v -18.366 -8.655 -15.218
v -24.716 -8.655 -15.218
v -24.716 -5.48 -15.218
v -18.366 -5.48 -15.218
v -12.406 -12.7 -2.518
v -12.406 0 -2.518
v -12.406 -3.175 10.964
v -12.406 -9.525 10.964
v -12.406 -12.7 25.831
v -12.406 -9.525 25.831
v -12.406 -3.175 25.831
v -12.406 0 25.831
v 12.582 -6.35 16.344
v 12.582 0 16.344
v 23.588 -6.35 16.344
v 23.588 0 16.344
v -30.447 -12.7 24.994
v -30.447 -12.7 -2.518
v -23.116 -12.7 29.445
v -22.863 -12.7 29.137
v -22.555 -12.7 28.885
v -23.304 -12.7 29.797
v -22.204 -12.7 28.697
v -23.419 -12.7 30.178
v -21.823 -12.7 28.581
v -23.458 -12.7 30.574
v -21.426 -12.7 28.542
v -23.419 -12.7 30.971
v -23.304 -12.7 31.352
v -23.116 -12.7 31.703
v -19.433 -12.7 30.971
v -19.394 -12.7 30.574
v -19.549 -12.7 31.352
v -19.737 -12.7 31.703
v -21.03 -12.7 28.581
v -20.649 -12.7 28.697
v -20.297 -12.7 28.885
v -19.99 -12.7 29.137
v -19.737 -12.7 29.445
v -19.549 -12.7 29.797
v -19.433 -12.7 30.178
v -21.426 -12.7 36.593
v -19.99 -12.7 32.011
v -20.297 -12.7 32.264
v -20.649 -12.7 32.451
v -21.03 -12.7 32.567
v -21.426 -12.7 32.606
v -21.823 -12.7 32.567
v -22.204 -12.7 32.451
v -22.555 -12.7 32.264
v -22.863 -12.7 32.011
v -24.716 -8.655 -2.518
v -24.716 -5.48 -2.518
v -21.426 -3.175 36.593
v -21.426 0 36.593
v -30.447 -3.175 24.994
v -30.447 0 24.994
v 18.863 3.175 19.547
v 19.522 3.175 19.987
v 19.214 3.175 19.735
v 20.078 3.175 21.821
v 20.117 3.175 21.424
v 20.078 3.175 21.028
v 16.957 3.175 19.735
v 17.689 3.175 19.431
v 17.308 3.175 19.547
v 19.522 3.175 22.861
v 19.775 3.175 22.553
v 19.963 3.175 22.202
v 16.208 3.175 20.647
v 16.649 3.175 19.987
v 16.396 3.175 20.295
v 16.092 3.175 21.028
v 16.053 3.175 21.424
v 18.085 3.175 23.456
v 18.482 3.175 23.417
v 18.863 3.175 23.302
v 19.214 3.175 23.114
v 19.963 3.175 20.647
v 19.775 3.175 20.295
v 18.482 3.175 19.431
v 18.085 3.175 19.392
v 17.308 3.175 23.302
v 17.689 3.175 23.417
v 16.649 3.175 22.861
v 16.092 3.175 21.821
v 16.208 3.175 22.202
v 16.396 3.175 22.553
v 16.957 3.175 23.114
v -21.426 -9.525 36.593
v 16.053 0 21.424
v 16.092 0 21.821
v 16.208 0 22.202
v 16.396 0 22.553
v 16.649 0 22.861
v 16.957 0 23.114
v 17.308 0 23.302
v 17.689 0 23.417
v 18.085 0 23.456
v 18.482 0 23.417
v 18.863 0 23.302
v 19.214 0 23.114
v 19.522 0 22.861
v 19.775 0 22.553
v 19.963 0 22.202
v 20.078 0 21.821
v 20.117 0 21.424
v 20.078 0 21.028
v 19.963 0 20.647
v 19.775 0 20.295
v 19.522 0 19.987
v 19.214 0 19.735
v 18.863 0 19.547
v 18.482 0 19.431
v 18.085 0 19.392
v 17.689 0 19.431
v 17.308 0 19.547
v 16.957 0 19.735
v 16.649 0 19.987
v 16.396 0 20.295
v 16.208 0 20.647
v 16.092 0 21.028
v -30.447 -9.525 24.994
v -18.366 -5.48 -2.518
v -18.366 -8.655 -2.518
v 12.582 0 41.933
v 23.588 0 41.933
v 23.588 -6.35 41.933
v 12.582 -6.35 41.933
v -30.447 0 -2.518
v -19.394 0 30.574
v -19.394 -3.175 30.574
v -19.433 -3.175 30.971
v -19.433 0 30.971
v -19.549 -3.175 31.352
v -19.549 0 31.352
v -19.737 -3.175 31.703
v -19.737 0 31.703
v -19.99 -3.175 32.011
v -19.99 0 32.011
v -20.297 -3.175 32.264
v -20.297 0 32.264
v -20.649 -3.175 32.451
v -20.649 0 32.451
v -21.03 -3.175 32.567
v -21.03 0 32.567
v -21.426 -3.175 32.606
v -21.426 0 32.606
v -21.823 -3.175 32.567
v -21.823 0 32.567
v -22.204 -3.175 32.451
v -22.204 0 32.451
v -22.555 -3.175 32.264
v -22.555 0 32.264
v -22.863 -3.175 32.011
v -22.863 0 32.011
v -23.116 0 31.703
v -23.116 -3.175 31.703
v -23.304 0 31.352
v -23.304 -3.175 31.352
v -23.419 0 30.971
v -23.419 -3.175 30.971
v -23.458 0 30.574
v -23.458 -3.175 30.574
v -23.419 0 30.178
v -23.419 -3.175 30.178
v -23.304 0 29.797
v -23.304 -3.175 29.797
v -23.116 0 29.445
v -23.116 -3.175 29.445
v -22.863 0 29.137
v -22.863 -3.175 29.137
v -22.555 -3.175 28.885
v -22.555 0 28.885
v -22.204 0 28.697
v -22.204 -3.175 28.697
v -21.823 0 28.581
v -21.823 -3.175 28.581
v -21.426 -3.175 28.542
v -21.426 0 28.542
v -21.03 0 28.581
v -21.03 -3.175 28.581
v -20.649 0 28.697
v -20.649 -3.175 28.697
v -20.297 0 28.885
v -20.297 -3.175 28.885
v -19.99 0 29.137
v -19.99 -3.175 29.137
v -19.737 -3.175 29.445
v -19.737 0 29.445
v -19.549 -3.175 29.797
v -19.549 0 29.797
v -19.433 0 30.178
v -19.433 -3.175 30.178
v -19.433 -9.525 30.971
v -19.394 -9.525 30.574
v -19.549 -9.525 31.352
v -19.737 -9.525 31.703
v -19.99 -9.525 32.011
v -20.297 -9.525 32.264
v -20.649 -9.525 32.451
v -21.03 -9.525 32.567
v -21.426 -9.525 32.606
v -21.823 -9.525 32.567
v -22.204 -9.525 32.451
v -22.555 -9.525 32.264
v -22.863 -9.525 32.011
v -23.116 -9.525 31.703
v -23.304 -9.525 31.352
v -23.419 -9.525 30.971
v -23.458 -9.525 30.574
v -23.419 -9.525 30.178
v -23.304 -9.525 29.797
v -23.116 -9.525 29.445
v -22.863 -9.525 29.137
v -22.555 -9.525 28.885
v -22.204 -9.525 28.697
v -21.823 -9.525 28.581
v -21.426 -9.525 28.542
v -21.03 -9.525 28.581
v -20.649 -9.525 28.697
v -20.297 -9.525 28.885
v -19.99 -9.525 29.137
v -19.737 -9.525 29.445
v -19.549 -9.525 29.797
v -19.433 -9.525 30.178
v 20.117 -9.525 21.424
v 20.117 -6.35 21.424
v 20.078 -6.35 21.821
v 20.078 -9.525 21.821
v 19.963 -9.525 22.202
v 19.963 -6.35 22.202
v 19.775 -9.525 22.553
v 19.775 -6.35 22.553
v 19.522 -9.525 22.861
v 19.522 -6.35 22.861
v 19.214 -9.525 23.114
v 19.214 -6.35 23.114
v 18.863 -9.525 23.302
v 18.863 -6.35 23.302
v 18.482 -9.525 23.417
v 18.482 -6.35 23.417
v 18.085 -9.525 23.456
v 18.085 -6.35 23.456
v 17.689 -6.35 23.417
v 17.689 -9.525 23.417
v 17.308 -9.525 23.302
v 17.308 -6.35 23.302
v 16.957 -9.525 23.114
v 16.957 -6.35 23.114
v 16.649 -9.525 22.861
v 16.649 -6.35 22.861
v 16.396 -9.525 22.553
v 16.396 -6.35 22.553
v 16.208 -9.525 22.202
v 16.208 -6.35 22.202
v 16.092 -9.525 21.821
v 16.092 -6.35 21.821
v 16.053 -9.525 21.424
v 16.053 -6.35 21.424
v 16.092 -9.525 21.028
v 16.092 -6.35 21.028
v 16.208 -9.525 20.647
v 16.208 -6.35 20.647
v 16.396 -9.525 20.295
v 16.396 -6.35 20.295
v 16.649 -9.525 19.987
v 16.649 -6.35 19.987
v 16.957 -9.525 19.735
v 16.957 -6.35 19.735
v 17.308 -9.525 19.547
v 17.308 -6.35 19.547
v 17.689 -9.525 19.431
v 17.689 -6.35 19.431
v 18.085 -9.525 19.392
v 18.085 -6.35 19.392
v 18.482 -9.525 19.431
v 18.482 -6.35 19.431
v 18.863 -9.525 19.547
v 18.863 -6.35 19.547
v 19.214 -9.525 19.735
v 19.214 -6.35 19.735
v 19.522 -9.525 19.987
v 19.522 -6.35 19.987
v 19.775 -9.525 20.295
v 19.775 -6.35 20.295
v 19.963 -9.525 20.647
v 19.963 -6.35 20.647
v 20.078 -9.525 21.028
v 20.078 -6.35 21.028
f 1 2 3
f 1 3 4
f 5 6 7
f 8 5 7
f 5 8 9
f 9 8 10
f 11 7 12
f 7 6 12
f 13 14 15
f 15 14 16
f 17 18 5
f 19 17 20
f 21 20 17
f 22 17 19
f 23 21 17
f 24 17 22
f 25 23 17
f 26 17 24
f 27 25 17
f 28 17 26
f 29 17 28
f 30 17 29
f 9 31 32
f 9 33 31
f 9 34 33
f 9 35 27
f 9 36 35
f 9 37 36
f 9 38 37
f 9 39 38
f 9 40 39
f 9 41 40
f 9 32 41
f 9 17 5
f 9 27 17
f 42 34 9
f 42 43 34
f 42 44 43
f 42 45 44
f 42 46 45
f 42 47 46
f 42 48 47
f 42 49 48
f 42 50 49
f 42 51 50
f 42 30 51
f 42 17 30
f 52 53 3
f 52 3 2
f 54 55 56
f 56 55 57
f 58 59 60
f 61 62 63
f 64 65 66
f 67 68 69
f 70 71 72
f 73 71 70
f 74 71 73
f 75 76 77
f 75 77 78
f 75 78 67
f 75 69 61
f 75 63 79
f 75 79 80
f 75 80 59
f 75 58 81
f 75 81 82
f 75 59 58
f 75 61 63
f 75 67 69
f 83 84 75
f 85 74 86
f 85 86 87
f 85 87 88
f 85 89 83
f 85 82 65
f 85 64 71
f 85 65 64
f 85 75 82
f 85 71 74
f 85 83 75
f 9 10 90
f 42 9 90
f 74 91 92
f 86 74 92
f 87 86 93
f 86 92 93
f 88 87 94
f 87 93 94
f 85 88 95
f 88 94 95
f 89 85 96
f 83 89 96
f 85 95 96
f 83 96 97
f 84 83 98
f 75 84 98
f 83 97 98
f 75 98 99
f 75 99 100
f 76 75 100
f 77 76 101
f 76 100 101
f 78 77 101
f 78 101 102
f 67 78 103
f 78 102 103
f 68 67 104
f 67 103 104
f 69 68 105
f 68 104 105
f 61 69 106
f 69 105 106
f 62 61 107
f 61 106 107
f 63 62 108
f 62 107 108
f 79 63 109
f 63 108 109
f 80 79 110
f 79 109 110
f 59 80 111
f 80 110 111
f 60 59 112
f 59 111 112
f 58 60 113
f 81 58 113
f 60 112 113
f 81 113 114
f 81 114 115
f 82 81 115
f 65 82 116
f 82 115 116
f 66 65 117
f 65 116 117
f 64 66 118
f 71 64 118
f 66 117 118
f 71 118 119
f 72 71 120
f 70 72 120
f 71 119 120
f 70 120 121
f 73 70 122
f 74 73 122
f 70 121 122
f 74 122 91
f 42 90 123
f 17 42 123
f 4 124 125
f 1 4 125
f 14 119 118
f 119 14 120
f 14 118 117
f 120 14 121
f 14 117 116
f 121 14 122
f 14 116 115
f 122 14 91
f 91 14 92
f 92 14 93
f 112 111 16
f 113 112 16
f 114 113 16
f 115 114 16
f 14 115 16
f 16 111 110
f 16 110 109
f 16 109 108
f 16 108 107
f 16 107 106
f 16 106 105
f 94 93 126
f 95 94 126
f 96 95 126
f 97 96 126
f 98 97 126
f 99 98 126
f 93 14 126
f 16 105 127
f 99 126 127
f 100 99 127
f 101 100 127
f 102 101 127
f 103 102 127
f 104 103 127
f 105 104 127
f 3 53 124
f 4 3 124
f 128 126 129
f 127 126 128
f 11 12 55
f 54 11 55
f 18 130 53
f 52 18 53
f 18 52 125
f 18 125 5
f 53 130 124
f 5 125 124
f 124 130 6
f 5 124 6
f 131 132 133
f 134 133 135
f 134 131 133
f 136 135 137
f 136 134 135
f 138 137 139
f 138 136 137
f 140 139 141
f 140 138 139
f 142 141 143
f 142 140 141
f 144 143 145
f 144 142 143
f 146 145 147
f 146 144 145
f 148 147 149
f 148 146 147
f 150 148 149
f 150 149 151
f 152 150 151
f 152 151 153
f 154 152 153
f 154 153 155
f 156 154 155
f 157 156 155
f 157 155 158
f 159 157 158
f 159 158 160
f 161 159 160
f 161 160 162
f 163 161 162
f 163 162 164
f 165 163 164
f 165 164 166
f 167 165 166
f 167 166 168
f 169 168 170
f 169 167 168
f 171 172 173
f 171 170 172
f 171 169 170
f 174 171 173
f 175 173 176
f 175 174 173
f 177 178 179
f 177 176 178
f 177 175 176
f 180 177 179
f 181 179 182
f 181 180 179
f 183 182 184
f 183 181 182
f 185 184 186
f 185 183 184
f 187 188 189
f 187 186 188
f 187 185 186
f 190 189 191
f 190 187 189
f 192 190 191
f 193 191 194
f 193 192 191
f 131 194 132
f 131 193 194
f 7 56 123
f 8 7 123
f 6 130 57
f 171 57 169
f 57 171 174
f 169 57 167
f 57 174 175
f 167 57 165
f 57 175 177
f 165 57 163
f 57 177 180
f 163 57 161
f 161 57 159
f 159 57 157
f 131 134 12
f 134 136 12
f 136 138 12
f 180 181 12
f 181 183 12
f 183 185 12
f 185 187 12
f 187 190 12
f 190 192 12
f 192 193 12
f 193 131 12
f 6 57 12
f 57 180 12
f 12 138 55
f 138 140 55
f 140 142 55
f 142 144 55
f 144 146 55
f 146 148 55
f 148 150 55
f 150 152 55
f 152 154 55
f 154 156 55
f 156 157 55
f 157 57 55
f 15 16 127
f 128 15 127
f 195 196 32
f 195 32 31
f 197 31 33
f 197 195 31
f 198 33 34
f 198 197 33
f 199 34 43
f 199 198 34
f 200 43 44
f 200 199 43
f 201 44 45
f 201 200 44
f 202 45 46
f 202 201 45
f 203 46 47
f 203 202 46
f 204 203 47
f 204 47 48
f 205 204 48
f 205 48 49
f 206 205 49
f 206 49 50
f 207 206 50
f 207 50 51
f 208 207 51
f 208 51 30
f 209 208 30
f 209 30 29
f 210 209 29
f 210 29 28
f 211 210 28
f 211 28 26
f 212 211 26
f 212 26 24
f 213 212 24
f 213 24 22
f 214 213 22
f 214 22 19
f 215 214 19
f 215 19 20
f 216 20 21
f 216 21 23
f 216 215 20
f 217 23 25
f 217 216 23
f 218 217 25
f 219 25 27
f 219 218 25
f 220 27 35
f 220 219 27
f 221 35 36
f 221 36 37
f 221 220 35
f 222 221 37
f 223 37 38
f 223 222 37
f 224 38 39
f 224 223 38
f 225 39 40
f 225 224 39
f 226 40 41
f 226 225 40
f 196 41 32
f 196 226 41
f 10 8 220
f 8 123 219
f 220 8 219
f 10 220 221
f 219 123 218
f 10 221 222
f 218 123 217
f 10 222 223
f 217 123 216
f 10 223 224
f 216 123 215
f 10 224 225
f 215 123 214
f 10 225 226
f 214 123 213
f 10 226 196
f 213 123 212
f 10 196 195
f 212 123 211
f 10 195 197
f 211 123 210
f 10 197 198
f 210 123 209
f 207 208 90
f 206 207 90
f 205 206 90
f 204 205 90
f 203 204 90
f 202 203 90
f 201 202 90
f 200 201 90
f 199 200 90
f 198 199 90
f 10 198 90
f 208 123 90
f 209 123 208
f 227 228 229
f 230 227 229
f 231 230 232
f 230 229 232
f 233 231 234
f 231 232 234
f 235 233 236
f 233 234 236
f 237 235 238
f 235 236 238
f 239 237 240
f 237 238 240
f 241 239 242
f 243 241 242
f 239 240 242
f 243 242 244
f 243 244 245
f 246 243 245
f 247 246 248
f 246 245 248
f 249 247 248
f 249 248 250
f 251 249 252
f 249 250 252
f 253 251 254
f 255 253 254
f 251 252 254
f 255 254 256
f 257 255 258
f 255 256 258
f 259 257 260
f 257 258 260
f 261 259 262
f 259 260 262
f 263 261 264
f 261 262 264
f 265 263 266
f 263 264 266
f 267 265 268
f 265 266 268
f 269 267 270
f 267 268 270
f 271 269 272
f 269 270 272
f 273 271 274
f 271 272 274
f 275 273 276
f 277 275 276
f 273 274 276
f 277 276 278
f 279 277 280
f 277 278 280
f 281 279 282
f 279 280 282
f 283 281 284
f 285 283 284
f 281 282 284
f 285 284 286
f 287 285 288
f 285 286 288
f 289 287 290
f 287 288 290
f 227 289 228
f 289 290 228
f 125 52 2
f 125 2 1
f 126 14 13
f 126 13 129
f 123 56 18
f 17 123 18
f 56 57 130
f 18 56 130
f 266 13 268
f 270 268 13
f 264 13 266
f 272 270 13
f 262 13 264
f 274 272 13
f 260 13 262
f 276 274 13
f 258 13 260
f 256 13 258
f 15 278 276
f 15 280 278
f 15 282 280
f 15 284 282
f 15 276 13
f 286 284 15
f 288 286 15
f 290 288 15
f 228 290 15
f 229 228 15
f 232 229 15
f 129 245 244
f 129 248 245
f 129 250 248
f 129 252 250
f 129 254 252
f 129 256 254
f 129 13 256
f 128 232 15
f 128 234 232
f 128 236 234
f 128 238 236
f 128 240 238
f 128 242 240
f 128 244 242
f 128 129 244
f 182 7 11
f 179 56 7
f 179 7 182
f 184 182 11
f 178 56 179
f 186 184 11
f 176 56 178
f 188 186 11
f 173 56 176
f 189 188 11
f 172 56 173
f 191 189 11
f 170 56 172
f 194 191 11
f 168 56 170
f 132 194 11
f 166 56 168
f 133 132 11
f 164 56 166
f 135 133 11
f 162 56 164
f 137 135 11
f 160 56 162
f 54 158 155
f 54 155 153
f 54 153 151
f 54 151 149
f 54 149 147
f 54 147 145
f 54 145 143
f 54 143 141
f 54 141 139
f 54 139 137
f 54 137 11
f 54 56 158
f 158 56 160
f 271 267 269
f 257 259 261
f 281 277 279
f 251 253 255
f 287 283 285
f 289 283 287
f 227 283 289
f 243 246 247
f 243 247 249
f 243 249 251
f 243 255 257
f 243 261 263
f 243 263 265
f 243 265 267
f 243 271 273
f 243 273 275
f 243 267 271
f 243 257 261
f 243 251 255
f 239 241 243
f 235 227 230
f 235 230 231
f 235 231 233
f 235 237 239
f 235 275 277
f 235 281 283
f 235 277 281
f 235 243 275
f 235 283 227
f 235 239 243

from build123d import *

# Parameters (mm, degrees)
F0_R      = 2.032
F1_DEPTH  = 12.7
F2_W      = 6.35
F2_H      = 14.692879385
F3_DEPTH  = 25.4
F4_W      = 11.0059620068
F4_H      = 25.5892152746
F5_DEPTH  = 6.35
F6_R      = 2.032
F8_DEPTH  = 3.175
F7_R      = 2.032
F9_DEPTH  = 3.175
F10_W     = 6.35
F10_H     = 3.175
F11_DEPTH = 12.7


with BuildPart() as f1:
    # F0 (on Front) → F1 (new body)
    with BuildSketch(Plane.XZ):
        Polygon((-12.4060919796, 25.8314568394), (-21.4263913222, 36.5925505482), (-30.4466906647, 24.9944944872), (-30.4466906647, -2.5175290372), (-12.4060919796, -2.5175290372), align=None)
        with Locations((-21.4263913222, 30.5741173131)):
            Circle(F0_R, mode=Mode.SUBTRACT)
    extrude(amount=F1_DEPTH)

    # F2 (on face) → F3 (cut)
    with BuildSketch(Plane(origin=(-31.0838625283, 0, 24.1752361994), x_dir=(0, -1, 0), z_dir=(-0.7893657708, 0, 0.6139231873))):
        with Locations((6.35, 8.3843087237)):
            Rectangle(F2_W, F2_H)
    extrude(amount=-F3_DEPTH, mode=Mode.SUBTRACT)

    # F10 (on face) → F11 (join)
    with BuildSketch(Plane(origin=(0, 0, -2.5175290372), x_dir=(1, 0, 0), z_dir=(0, 0, -1))):
        with Locations((-21.540818736, 7.0673617972)):
            Rectangle(F10_W, F10_H)
    extrude(amount=F11_DEPTH)


with BuildPart() as f5:
    # F4 (on Front) → F5 (new body)
    with BuildSketch(Plane.XZ):
        with Locations((18.0854215287, 29.1388873011)):
            Rectangle(F4_W, F4_H)
    extrude(amount=F5_DEPTH)

    # F6 (on face) → F8 (join)
    with BuildSketch(Plane.XZ.offset(6.35)):
        with Locations((18.0854215287, 21.4242796638)):
            Circle(F6_R)
    extrude(amount=F8_DEPTH)

    # F7 (on face) → F9 (join)
    with BuildSketch(Plane(origin=(0, 0, 0), x_dir=(-1, 0, 0), z_dir=(0, 1, 0))):
        with Locations((-18.0854215287, 21.4242796638)):
            Circle(F7_R)
    extrude(amount=F9_DEPTH)


solid = Compound([f1.part, f5.part])
